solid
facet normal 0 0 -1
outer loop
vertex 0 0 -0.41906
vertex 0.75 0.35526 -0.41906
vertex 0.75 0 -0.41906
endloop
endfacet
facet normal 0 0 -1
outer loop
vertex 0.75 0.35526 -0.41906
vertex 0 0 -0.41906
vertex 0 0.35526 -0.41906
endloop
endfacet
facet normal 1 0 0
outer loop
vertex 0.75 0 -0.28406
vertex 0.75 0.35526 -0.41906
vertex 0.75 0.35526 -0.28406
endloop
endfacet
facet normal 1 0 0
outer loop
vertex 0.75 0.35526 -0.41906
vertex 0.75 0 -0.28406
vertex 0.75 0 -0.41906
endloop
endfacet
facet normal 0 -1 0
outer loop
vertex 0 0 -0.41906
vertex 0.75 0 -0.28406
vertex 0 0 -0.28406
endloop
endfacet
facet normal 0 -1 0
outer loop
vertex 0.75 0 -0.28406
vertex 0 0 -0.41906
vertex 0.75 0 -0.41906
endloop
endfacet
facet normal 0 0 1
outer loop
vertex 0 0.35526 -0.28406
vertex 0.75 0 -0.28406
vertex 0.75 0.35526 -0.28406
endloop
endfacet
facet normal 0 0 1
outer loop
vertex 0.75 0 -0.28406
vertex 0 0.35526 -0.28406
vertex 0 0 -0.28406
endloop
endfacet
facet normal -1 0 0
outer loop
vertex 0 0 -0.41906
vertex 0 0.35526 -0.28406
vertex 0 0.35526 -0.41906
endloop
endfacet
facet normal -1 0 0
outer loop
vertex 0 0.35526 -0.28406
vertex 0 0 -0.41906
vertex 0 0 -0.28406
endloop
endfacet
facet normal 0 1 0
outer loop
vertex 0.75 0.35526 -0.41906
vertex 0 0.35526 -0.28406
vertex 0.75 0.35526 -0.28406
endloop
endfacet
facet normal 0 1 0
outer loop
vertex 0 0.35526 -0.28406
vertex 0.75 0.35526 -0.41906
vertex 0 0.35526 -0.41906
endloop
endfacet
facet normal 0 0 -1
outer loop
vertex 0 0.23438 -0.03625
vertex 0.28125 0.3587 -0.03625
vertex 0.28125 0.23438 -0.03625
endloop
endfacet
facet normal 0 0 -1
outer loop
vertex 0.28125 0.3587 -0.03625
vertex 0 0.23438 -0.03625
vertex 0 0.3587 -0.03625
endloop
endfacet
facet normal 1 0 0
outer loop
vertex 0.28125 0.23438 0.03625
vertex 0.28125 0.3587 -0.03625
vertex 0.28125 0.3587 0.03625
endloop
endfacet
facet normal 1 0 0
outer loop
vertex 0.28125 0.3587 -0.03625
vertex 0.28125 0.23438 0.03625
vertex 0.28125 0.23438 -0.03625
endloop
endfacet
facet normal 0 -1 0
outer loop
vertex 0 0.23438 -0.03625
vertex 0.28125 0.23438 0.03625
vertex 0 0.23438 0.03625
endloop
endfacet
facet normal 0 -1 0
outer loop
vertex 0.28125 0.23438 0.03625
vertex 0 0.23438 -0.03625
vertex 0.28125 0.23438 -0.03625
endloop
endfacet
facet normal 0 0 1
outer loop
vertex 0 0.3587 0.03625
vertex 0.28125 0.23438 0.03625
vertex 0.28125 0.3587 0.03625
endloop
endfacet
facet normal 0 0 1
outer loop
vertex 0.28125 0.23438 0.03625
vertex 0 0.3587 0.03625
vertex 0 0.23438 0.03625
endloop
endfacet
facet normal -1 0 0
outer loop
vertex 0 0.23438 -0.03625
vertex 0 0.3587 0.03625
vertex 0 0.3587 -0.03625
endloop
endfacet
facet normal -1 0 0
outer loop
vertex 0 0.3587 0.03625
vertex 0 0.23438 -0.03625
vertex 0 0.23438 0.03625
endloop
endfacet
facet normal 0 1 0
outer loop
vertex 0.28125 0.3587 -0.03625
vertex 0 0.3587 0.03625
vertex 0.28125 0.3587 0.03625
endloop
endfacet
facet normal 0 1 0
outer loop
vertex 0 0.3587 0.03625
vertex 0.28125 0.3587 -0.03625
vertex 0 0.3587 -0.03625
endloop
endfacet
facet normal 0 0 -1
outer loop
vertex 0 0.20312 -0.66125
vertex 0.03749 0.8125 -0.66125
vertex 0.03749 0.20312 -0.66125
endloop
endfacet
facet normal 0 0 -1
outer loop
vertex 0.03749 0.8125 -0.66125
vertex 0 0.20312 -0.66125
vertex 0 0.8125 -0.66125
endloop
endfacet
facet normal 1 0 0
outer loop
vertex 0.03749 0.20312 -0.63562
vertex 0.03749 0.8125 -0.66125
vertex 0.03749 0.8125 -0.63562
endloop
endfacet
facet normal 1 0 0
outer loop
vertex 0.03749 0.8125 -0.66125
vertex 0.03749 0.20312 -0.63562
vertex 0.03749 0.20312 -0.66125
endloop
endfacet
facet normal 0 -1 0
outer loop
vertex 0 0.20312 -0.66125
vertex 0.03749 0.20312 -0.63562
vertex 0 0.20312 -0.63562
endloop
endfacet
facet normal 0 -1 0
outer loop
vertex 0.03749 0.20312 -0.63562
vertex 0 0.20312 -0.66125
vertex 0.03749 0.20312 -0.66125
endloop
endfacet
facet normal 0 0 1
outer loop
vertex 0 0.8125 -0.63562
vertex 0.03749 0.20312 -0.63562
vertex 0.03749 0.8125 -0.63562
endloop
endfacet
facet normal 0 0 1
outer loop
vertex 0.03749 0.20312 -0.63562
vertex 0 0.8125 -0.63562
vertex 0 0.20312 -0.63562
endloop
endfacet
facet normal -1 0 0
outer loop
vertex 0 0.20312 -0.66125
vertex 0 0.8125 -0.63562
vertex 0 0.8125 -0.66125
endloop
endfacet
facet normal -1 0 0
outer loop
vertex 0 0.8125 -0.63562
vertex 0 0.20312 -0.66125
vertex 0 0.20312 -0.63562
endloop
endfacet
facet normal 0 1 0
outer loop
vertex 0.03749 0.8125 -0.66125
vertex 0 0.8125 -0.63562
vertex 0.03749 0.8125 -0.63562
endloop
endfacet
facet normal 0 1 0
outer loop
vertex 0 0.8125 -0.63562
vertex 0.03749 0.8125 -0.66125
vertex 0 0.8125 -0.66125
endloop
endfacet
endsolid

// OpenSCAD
EPS = 0.01;

module sketch0() {
    translate([0, 0, -0.3515625])
    linear_extrude(height=0.125 + EPS, center=true)
    polygon(points=[[0.19736842105263158, 0.0], [0.2368421052631579, 0.0], [0.35526315789473684, 0.0], [0.39473684210526316, 0.0], [0.5131578947368421, 0.0], [0.5526315789473685, 0.0], [0.75, 0.0], [0.75, 0.35526315789473684], [0.5131578947368421, 0.35526315789473684], [0.2368421052631579, 0.35526315789473684], [0.0, 0.35526315789473684], [0.0, 0.0]]);
}

module sketch1() {
    translate([0, 0.234375, 0])
    linear_extrude(height=0.0625 + EPS, center=true)
    polygon(points=[[0.28125, 0.0], [0.28125, 0.12434210526315789], [0.0, 0.12434210526315789], [0.0, 0.0]]);
}

module sketch2() {
    translate([0, 0.203125, -0.6484375])
    linear_extrude(height=0.015625 + EPS, center=true)
    polygon(points=[[0.037500000000000006, 0.0], [0.037500000000000006, 0.296875], [0.0, 0.296875], [0.0, 0.0]]);
}

module sketch3() {
    translate([0, 0.359375, -0.6484375])
    linear_extrude(height=0.015625 + EPS, center=true)
    polygon(points=[[0.037500000000000006, 0.0], [0.037500000000000006, 0.296875], [0.0, 0.296875], [0.0, 0.0]]);
}

module sketch4() {
    translate([0, 0.515625, -0.6484375])
    linear_extrude(height=0.015625 + EPS, center=true)
    polygon(points=[[0.037500000000000006, 0.0], [0.037500000000000006, 0.296875], [0.0, 0.296875], [0.0, 0.0]]);
}

union() {
    sketch0();
    sketch1();
    sketch2();
    sketch3();
    sketch4();
}
